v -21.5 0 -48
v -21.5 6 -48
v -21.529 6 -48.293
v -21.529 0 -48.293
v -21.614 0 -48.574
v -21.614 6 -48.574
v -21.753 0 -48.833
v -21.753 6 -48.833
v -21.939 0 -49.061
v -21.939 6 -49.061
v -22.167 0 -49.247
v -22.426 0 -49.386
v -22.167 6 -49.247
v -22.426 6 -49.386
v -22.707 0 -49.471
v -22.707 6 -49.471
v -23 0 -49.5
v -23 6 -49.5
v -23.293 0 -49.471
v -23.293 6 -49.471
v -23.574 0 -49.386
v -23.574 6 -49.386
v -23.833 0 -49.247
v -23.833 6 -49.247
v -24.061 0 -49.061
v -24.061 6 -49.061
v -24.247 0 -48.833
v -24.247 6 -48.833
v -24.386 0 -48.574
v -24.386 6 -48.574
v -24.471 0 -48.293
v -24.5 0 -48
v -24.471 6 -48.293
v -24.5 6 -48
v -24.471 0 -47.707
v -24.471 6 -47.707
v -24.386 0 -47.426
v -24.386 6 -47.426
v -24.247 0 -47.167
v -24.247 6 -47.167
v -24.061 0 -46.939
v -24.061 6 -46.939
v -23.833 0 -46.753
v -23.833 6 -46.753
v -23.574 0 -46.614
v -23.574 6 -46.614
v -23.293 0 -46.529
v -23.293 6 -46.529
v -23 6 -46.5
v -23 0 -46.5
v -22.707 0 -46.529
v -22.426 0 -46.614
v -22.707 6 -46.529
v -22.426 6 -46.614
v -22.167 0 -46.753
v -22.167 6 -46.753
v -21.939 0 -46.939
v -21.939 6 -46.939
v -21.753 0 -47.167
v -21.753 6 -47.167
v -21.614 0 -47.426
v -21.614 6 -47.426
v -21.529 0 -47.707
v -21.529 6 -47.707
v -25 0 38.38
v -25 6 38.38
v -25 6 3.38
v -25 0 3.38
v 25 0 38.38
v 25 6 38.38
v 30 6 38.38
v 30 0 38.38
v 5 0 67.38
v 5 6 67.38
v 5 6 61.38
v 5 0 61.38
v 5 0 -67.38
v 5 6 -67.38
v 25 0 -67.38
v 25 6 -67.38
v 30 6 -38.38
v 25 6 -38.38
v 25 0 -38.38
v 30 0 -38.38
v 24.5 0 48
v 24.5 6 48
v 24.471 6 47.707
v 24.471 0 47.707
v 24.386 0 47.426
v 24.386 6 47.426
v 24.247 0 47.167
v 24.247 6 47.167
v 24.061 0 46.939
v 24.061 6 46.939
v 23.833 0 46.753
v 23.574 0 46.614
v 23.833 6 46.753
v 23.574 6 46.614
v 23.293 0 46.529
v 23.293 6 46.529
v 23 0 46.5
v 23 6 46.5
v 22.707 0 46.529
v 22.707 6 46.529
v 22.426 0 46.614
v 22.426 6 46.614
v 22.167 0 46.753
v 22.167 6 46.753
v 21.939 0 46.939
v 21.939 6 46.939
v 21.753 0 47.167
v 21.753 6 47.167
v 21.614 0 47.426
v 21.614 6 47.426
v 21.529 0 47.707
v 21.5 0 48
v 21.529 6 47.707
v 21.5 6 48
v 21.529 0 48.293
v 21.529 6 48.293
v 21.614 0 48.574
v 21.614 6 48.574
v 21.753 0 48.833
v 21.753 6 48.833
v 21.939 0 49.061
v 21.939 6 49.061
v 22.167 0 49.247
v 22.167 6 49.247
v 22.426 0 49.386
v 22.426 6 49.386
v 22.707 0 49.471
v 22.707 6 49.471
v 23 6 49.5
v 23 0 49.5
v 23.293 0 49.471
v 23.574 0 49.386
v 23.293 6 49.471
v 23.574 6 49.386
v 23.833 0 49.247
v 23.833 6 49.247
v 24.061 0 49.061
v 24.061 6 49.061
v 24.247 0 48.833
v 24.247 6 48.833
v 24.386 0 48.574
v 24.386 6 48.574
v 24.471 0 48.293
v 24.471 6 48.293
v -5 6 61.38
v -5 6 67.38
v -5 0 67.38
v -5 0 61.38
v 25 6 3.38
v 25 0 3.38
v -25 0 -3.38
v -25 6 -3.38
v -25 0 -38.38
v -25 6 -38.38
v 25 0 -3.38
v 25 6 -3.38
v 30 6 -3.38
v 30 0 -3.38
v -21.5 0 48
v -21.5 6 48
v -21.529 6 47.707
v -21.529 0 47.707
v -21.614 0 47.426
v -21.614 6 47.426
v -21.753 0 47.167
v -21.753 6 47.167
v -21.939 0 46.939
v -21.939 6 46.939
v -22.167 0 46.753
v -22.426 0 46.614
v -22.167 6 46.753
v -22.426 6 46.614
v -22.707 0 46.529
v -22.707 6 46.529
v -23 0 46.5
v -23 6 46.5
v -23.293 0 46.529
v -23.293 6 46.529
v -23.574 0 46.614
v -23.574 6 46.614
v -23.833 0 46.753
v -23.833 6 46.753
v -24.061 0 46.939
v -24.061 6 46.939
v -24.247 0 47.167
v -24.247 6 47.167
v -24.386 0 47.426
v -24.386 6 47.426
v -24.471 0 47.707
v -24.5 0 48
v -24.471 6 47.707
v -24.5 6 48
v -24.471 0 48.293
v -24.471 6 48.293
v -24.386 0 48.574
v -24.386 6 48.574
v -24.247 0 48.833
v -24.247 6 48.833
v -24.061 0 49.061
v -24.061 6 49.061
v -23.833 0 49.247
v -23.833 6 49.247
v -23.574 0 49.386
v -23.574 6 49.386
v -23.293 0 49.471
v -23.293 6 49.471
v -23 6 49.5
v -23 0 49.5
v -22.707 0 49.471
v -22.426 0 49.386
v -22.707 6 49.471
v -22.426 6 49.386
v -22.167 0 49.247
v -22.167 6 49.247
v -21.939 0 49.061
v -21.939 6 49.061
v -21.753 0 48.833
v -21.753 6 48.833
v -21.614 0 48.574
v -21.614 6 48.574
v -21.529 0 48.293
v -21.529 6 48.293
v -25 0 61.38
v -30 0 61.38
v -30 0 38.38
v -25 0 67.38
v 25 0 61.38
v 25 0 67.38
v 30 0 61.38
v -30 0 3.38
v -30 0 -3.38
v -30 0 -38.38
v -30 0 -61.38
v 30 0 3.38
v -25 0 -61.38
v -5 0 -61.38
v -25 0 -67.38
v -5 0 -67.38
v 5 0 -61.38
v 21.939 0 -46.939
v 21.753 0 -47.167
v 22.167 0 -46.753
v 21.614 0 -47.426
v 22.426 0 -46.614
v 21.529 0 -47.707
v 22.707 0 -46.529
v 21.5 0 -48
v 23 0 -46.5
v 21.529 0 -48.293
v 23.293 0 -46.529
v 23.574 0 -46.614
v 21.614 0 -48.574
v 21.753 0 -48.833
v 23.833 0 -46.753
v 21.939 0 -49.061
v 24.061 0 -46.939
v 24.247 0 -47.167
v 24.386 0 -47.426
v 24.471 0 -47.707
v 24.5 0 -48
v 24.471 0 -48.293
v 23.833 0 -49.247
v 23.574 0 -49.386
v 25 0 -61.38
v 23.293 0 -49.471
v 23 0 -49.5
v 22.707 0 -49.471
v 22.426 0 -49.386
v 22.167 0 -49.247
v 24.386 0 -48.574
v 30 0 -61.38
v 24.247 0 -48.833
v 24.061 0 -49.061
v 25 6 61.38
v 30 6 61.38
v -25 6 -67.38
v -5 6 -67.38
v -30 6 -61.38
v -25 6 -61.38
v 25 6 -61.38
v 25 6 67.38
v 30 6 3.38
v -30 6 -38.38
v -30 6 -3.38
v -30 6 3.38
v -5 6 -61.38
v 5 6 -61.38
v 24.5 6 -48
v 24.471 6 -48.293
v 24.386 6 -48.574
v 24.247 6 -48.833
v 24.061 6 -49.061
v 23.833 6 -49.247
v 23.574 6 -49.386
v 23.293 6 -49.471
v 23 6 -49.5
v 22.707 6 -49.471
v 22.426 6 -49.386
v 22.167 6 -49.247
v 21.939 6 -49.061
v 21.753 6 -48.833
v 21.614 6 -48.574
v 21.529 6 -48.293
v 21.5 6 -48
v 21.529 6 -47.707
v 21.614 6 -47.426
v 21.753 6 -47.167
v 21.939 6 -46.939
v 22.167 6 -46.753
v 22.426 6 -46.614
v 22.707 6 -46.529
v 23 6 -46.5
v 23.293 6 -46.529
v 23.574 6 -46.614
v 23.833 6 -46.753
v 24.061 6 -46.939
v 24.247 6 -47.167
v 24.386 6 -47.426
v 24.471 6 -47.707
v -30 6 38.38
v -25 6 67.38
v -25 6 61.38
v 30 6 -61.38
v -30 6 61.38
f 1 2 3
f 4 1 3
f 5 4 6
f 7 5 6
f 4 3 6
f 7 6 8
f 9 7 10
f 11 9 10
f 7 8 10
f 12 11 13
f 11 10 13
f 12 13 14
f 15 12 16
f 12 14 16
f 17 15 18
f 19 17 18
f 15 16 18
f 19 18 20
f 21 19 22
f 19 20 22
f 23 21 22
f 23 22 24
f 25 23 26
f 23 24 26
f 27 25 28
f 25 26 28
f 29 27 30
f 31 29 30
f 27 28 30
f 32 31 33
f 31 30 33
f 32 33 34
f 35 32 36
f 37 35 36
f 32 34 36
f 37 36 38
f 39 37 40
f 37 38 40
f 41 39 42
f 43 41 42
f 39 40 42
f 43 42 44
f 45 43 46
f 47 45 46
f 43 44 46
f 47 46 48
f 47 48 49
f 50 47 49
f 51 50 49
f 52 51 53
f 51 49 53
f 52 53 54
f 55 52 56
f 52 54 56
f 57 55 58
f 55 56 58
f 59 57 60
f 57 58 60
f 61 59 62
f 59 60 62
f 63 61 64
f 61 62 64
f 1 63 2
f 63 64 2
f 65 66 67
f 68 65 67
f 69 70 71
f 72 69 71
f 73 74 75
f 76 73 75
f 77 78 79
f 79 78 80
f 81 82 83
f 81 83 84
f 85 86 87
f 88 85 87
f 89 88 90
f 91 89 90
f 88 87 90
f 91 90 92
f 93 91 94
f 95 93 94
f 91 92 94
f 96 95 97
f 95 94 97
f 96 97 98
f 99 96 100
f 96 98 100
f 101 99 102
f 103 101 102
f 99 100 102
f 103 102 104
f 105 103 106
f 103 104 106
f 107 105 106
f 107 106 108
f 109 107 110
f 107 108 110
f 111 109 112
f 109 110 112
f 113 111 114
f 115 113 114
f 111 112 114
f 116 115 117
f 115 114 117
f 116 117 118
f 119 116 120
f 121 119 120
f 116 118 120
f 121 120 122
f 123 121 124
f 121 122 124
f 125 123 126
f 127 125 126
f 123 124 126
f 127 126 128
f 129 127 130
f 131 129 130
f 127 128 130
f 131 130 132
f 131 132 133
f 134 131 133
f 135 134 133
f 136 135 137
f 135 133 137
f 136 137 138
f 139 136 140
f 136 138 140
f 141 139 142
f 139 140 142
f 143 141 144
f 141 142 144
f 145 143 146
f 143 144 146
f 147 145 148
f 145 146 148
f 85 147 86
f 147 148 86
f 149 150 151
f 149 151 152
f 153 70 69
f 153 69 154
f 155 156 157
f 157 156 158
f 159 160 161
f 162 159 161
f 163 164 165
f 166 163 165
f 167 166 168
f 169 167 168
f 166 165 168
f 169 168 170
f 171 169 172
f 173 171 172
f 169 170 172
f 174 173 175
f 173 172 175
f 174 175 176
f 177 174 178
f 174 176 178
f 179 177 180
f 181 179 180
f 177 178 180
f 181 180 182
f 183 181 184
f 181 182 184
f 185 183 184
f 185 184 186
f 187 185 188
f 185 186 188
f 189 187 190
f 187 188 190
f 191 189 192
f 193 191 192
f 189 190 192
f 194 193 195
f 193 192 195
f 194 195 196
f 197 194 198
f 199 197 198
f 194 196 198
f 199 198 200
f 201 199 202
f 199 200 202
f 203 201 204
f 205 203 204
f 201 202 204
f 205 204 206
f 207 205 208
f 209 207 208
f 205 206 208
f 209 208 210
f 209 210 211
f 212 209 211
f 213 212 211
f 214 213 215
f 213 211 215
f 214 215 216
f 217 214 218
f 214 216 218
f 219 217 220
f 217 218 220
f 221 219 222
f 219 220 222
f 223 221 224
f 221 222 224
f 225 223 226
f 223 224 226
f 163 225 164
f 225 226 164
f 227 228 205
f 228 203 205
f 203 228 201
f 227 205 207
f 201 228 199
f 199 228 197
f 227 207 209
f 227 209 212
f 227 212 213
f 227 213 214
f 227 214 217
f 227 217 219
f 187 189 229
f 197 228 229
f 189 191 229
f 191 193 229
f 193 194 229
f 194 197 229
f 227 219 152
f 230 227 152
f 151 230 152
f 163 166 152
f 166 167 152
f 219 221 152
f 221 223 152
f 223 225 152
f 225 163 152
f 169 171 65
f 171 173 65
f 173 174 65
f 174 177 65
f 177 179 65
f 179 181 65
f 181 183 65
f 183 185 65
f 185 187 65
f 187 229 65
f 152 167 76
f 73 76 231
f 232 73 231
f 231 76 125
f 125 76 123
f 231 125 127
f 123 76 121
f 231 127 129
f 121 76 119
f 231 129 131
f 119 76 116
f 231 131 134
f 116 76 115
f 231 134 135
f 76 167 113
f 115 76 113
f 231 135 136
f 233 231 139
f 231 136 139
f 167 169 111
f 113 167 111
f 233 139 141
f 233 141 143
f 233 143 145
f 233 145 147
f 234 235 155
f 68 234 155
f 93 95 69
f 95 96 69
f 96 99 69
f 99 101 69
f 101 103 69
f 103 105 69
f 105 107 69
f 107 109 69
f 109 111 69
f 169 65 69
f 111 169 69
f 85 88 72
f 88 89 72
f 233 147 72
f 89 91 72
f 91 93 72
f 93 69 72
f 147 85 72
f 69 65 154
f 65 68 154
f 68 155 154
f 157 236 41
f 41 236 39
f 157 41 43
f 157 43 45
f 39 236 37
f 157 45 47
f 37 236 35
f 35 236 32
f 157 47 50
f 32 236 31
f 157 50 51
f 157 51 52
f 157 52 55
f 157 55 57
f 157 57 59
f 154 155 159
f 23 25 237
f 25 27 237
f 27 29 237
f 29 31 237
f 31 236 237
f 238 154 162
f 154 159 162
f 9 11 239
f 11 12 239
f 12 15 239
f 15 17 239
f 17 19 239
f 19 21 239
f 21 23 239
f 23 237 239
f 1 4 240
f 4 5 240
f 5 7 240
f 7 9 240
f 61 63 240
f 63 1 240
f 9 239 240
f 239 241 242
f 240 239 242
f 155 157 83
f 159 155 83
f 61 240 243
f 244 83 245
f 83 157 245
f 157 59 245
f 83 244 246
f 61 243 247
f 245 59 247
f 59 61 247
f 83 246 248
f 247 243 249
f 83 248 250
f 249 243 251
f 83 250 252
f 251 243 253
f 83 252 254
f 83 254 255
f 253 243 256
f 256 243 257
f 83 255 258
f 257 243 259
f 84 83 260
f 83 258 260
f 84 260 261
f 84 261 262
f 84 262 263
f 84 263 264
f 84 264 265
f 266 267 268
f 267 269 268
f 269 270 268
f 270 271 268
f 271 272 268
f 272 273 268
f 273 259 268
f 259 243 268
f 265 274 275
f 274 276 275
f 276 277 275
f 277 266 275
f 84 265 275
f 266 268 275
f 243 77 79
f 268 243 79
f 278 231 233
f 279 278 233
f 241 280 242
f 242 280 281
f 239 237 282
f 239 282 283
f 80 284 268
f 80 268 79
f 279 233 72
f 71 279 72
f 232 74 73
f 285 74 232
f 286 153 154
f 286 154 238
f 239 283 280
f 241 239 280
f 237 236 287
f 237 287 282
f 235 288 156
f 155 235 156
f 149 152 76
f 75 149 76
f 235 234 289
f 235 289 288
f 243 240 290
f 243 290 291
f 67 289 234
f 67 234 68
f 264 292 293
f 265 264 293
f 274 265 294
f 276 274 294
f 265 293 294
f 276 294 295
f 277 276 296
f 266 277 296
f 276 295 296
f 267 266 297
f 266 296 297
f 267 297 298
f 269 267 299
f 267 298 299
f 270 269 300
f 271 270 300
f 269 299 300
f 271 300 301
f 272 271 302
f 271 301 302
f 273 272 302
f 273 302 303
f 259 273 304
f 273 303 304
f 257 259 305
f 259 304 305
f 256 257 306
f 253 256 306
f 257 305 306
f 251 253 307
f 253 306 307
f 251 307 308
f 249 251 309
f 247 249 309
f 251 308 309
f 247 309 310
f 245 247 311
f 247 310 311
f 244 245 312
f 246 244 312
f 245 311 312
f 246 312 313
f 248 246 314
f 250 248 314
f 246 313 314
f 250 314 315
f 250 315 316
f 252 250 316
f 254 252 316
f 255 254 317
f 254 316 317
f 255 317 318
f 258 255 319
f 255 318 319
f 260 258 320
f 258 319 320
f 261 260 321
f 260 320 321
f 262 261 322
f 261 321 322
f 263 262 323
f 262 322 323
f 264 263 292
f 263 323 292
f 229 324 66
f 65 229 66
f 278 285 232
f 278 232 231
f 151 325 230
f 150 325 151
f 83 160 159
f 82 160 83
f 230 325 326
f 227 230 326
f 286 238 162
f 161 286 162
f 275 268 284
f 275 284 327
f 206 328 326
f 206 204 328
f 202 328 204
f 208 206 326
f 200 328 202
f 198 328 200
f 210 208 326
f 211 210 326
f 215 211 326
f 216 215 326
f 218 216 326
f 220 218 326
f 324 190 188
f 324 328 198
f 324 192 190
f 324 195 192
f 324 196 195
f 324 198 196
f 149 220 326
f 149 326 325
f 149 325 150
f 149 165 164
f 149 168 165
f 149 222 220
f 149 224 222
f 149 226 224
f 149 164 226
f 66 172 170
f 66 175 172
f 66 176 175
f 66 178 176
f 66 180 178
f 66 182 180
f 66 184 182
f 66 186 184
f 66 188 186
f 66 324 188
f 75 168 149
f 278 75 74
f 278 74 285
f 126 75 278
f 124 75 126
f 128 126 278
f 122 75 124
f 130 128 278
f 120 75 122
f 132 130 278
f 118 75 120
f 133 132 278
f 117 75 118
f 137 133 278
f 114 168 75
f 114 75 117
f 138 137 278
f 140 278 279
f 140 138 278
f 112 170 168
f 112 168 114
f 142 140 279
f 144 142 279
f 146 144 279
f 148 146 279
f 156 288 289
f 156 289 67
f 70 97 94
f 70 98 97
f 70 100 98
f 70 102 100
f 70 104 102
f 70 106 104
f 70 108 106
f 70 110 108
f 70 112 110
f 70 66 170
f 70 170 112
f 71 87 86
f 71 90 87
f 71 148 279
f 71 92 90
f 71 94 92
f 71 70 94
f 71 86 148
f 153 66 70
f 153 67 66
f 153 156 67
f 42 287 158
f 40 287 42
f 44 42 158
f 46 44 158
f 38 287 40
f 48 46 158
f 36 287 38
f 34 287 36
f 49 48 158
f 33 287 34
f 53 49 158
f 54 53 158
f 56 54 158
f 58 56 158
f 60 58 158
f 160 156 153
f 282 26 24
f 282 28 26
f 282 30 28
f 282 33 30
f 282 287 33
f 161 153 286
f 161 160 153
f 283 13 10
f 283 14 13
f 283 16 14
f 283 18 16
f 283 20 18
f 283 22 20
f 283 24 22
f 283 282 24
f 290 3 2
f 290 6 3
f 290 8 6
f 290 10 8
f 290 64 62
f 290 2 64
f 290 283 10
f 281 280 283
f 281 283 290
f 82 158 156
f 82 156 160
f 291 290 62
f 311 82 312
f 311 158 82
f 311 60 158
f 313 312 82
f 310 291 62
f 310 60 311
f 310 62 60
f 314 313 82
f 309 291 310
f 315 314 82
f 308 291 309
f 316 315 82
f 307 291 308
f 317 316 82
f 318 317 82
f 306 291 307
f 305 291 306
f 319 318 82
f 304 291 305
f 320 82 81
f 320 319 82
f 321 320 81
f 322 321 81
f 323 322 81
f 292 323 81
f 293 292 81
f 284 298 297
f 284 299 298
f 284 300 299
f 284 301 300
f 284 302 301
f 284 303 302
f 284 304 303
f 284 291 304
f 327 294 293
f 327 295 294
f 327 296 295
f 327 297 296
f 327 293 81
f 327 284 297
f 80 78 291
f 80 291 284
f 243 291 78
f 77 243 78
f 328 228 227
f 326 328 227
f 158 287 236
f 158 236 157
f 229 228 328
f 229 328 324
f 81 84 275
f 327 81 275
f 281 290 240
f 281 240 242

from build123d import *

# Parameters (mm, degrees)
ESQUISSE1_W             = 60
ESQUISSE1_H             = 122.76
BOSS_EXTRU_1_DEPTH      = 6
ESQUISSE2_W             = 20
ESQUISSE2_H             = 6
BOSS_EXTRU_2_DEPTH      = 6
ESQUISSE3_R             = 1.5
ENL_V_MAT_EXTRU_1_DEPTH = 6
ESQUISSE4_W             = 5
ESQUISSE4_H             = 35
ENL_V_MAT_EXTRU_2_DEPTH = 6


with BuildPart() as part:
    # Esquisse1 → Boss.-Extru.1 (new body)
    with BuildSketch(Plane(origin=(0, 0, 0), x_dir=(1, 0, 0), z_dir=(0, 1, 0))):
        Rectangle(ESQUISSE1_W, ESQUISSE1_H)
    extrude(amount=BOSS_EXTRU_1_DEPTH)

    # Esquisse2 → Boss.-Extru.2 (add)
    with BuildSketch(Plane(origin=(0, 6, 0), x_dir=(1, 0, 0), z_dir=(0, 1, 0))):
        with Locations((-15, 64.38)):
            Rectangle(ESQUISSE2_W, ESQUISSE2_H)
        with Locations((15, 64.38)):
            Rectangle(ESQUISSE2_W, ESQUISSE2_H)
        with Locations((15, -64.38)):
            Rectangle(ESQUISSE2_W, ESQUISSE2_H)
        with Locations((-15, -64.38)):
            Rectangle(ESQUISSE2_W, ESQUISSE2_H)
    extrude(amount=-BOSS_EXTRU_2_DEPTH)

    # Esquisse3 → Enlèv. mat.-Extru.1 (cut)
    with BuildSketch(Plane(origin=(0, 6, 0), x_dir=(1, 0, 0), z_dir=(0, 1, 0))):
        with Locations((23, 48)):
            Circle(ESQUISSE3_R)
        with Locations((-23, 48)):
            Circle(ESQUISSE3_R)
        with Locations((-23, -48)):
            Circle(ESQUISSE3_R)
        with Locations((23, -48)):
            Circle(ESQUISSE3_R)
    extrude(amount=-ENL_V_MAT_EXTRU_1_DEPTH, mode=Mode.SUBTRACT)

    # Esquisse4 → Enlèv. mat.-Extru.2 (cut)
    with BuildSketch(Plane(origin=(0, 6, 0), x_dir=(1, 0, 0), z_dir=(0, 1, 0))):
        with Locations((-27.5, -20.88)):
            Rectangle(ESQUISSE4_W, ESQUISSE4_H)
        with Locations((27.5, -20.88)):
            Rectangle(ESQUISSE4_W, ESQUISSE4_H)
        with Locations((-27.5, 20.88)):
            Rectangle(ESQUISSE4_W, ESQUISSE4_H)
        with Locations((27.5, 20.88)):
            Rectangle(ESQUISSE4_W, ESQUISSE4_H)
    extrude(amount=-ENL_V_MAT_EXTRU_2_DEPTH, mode=Mode.SUBTRACT)


solid = part.part
